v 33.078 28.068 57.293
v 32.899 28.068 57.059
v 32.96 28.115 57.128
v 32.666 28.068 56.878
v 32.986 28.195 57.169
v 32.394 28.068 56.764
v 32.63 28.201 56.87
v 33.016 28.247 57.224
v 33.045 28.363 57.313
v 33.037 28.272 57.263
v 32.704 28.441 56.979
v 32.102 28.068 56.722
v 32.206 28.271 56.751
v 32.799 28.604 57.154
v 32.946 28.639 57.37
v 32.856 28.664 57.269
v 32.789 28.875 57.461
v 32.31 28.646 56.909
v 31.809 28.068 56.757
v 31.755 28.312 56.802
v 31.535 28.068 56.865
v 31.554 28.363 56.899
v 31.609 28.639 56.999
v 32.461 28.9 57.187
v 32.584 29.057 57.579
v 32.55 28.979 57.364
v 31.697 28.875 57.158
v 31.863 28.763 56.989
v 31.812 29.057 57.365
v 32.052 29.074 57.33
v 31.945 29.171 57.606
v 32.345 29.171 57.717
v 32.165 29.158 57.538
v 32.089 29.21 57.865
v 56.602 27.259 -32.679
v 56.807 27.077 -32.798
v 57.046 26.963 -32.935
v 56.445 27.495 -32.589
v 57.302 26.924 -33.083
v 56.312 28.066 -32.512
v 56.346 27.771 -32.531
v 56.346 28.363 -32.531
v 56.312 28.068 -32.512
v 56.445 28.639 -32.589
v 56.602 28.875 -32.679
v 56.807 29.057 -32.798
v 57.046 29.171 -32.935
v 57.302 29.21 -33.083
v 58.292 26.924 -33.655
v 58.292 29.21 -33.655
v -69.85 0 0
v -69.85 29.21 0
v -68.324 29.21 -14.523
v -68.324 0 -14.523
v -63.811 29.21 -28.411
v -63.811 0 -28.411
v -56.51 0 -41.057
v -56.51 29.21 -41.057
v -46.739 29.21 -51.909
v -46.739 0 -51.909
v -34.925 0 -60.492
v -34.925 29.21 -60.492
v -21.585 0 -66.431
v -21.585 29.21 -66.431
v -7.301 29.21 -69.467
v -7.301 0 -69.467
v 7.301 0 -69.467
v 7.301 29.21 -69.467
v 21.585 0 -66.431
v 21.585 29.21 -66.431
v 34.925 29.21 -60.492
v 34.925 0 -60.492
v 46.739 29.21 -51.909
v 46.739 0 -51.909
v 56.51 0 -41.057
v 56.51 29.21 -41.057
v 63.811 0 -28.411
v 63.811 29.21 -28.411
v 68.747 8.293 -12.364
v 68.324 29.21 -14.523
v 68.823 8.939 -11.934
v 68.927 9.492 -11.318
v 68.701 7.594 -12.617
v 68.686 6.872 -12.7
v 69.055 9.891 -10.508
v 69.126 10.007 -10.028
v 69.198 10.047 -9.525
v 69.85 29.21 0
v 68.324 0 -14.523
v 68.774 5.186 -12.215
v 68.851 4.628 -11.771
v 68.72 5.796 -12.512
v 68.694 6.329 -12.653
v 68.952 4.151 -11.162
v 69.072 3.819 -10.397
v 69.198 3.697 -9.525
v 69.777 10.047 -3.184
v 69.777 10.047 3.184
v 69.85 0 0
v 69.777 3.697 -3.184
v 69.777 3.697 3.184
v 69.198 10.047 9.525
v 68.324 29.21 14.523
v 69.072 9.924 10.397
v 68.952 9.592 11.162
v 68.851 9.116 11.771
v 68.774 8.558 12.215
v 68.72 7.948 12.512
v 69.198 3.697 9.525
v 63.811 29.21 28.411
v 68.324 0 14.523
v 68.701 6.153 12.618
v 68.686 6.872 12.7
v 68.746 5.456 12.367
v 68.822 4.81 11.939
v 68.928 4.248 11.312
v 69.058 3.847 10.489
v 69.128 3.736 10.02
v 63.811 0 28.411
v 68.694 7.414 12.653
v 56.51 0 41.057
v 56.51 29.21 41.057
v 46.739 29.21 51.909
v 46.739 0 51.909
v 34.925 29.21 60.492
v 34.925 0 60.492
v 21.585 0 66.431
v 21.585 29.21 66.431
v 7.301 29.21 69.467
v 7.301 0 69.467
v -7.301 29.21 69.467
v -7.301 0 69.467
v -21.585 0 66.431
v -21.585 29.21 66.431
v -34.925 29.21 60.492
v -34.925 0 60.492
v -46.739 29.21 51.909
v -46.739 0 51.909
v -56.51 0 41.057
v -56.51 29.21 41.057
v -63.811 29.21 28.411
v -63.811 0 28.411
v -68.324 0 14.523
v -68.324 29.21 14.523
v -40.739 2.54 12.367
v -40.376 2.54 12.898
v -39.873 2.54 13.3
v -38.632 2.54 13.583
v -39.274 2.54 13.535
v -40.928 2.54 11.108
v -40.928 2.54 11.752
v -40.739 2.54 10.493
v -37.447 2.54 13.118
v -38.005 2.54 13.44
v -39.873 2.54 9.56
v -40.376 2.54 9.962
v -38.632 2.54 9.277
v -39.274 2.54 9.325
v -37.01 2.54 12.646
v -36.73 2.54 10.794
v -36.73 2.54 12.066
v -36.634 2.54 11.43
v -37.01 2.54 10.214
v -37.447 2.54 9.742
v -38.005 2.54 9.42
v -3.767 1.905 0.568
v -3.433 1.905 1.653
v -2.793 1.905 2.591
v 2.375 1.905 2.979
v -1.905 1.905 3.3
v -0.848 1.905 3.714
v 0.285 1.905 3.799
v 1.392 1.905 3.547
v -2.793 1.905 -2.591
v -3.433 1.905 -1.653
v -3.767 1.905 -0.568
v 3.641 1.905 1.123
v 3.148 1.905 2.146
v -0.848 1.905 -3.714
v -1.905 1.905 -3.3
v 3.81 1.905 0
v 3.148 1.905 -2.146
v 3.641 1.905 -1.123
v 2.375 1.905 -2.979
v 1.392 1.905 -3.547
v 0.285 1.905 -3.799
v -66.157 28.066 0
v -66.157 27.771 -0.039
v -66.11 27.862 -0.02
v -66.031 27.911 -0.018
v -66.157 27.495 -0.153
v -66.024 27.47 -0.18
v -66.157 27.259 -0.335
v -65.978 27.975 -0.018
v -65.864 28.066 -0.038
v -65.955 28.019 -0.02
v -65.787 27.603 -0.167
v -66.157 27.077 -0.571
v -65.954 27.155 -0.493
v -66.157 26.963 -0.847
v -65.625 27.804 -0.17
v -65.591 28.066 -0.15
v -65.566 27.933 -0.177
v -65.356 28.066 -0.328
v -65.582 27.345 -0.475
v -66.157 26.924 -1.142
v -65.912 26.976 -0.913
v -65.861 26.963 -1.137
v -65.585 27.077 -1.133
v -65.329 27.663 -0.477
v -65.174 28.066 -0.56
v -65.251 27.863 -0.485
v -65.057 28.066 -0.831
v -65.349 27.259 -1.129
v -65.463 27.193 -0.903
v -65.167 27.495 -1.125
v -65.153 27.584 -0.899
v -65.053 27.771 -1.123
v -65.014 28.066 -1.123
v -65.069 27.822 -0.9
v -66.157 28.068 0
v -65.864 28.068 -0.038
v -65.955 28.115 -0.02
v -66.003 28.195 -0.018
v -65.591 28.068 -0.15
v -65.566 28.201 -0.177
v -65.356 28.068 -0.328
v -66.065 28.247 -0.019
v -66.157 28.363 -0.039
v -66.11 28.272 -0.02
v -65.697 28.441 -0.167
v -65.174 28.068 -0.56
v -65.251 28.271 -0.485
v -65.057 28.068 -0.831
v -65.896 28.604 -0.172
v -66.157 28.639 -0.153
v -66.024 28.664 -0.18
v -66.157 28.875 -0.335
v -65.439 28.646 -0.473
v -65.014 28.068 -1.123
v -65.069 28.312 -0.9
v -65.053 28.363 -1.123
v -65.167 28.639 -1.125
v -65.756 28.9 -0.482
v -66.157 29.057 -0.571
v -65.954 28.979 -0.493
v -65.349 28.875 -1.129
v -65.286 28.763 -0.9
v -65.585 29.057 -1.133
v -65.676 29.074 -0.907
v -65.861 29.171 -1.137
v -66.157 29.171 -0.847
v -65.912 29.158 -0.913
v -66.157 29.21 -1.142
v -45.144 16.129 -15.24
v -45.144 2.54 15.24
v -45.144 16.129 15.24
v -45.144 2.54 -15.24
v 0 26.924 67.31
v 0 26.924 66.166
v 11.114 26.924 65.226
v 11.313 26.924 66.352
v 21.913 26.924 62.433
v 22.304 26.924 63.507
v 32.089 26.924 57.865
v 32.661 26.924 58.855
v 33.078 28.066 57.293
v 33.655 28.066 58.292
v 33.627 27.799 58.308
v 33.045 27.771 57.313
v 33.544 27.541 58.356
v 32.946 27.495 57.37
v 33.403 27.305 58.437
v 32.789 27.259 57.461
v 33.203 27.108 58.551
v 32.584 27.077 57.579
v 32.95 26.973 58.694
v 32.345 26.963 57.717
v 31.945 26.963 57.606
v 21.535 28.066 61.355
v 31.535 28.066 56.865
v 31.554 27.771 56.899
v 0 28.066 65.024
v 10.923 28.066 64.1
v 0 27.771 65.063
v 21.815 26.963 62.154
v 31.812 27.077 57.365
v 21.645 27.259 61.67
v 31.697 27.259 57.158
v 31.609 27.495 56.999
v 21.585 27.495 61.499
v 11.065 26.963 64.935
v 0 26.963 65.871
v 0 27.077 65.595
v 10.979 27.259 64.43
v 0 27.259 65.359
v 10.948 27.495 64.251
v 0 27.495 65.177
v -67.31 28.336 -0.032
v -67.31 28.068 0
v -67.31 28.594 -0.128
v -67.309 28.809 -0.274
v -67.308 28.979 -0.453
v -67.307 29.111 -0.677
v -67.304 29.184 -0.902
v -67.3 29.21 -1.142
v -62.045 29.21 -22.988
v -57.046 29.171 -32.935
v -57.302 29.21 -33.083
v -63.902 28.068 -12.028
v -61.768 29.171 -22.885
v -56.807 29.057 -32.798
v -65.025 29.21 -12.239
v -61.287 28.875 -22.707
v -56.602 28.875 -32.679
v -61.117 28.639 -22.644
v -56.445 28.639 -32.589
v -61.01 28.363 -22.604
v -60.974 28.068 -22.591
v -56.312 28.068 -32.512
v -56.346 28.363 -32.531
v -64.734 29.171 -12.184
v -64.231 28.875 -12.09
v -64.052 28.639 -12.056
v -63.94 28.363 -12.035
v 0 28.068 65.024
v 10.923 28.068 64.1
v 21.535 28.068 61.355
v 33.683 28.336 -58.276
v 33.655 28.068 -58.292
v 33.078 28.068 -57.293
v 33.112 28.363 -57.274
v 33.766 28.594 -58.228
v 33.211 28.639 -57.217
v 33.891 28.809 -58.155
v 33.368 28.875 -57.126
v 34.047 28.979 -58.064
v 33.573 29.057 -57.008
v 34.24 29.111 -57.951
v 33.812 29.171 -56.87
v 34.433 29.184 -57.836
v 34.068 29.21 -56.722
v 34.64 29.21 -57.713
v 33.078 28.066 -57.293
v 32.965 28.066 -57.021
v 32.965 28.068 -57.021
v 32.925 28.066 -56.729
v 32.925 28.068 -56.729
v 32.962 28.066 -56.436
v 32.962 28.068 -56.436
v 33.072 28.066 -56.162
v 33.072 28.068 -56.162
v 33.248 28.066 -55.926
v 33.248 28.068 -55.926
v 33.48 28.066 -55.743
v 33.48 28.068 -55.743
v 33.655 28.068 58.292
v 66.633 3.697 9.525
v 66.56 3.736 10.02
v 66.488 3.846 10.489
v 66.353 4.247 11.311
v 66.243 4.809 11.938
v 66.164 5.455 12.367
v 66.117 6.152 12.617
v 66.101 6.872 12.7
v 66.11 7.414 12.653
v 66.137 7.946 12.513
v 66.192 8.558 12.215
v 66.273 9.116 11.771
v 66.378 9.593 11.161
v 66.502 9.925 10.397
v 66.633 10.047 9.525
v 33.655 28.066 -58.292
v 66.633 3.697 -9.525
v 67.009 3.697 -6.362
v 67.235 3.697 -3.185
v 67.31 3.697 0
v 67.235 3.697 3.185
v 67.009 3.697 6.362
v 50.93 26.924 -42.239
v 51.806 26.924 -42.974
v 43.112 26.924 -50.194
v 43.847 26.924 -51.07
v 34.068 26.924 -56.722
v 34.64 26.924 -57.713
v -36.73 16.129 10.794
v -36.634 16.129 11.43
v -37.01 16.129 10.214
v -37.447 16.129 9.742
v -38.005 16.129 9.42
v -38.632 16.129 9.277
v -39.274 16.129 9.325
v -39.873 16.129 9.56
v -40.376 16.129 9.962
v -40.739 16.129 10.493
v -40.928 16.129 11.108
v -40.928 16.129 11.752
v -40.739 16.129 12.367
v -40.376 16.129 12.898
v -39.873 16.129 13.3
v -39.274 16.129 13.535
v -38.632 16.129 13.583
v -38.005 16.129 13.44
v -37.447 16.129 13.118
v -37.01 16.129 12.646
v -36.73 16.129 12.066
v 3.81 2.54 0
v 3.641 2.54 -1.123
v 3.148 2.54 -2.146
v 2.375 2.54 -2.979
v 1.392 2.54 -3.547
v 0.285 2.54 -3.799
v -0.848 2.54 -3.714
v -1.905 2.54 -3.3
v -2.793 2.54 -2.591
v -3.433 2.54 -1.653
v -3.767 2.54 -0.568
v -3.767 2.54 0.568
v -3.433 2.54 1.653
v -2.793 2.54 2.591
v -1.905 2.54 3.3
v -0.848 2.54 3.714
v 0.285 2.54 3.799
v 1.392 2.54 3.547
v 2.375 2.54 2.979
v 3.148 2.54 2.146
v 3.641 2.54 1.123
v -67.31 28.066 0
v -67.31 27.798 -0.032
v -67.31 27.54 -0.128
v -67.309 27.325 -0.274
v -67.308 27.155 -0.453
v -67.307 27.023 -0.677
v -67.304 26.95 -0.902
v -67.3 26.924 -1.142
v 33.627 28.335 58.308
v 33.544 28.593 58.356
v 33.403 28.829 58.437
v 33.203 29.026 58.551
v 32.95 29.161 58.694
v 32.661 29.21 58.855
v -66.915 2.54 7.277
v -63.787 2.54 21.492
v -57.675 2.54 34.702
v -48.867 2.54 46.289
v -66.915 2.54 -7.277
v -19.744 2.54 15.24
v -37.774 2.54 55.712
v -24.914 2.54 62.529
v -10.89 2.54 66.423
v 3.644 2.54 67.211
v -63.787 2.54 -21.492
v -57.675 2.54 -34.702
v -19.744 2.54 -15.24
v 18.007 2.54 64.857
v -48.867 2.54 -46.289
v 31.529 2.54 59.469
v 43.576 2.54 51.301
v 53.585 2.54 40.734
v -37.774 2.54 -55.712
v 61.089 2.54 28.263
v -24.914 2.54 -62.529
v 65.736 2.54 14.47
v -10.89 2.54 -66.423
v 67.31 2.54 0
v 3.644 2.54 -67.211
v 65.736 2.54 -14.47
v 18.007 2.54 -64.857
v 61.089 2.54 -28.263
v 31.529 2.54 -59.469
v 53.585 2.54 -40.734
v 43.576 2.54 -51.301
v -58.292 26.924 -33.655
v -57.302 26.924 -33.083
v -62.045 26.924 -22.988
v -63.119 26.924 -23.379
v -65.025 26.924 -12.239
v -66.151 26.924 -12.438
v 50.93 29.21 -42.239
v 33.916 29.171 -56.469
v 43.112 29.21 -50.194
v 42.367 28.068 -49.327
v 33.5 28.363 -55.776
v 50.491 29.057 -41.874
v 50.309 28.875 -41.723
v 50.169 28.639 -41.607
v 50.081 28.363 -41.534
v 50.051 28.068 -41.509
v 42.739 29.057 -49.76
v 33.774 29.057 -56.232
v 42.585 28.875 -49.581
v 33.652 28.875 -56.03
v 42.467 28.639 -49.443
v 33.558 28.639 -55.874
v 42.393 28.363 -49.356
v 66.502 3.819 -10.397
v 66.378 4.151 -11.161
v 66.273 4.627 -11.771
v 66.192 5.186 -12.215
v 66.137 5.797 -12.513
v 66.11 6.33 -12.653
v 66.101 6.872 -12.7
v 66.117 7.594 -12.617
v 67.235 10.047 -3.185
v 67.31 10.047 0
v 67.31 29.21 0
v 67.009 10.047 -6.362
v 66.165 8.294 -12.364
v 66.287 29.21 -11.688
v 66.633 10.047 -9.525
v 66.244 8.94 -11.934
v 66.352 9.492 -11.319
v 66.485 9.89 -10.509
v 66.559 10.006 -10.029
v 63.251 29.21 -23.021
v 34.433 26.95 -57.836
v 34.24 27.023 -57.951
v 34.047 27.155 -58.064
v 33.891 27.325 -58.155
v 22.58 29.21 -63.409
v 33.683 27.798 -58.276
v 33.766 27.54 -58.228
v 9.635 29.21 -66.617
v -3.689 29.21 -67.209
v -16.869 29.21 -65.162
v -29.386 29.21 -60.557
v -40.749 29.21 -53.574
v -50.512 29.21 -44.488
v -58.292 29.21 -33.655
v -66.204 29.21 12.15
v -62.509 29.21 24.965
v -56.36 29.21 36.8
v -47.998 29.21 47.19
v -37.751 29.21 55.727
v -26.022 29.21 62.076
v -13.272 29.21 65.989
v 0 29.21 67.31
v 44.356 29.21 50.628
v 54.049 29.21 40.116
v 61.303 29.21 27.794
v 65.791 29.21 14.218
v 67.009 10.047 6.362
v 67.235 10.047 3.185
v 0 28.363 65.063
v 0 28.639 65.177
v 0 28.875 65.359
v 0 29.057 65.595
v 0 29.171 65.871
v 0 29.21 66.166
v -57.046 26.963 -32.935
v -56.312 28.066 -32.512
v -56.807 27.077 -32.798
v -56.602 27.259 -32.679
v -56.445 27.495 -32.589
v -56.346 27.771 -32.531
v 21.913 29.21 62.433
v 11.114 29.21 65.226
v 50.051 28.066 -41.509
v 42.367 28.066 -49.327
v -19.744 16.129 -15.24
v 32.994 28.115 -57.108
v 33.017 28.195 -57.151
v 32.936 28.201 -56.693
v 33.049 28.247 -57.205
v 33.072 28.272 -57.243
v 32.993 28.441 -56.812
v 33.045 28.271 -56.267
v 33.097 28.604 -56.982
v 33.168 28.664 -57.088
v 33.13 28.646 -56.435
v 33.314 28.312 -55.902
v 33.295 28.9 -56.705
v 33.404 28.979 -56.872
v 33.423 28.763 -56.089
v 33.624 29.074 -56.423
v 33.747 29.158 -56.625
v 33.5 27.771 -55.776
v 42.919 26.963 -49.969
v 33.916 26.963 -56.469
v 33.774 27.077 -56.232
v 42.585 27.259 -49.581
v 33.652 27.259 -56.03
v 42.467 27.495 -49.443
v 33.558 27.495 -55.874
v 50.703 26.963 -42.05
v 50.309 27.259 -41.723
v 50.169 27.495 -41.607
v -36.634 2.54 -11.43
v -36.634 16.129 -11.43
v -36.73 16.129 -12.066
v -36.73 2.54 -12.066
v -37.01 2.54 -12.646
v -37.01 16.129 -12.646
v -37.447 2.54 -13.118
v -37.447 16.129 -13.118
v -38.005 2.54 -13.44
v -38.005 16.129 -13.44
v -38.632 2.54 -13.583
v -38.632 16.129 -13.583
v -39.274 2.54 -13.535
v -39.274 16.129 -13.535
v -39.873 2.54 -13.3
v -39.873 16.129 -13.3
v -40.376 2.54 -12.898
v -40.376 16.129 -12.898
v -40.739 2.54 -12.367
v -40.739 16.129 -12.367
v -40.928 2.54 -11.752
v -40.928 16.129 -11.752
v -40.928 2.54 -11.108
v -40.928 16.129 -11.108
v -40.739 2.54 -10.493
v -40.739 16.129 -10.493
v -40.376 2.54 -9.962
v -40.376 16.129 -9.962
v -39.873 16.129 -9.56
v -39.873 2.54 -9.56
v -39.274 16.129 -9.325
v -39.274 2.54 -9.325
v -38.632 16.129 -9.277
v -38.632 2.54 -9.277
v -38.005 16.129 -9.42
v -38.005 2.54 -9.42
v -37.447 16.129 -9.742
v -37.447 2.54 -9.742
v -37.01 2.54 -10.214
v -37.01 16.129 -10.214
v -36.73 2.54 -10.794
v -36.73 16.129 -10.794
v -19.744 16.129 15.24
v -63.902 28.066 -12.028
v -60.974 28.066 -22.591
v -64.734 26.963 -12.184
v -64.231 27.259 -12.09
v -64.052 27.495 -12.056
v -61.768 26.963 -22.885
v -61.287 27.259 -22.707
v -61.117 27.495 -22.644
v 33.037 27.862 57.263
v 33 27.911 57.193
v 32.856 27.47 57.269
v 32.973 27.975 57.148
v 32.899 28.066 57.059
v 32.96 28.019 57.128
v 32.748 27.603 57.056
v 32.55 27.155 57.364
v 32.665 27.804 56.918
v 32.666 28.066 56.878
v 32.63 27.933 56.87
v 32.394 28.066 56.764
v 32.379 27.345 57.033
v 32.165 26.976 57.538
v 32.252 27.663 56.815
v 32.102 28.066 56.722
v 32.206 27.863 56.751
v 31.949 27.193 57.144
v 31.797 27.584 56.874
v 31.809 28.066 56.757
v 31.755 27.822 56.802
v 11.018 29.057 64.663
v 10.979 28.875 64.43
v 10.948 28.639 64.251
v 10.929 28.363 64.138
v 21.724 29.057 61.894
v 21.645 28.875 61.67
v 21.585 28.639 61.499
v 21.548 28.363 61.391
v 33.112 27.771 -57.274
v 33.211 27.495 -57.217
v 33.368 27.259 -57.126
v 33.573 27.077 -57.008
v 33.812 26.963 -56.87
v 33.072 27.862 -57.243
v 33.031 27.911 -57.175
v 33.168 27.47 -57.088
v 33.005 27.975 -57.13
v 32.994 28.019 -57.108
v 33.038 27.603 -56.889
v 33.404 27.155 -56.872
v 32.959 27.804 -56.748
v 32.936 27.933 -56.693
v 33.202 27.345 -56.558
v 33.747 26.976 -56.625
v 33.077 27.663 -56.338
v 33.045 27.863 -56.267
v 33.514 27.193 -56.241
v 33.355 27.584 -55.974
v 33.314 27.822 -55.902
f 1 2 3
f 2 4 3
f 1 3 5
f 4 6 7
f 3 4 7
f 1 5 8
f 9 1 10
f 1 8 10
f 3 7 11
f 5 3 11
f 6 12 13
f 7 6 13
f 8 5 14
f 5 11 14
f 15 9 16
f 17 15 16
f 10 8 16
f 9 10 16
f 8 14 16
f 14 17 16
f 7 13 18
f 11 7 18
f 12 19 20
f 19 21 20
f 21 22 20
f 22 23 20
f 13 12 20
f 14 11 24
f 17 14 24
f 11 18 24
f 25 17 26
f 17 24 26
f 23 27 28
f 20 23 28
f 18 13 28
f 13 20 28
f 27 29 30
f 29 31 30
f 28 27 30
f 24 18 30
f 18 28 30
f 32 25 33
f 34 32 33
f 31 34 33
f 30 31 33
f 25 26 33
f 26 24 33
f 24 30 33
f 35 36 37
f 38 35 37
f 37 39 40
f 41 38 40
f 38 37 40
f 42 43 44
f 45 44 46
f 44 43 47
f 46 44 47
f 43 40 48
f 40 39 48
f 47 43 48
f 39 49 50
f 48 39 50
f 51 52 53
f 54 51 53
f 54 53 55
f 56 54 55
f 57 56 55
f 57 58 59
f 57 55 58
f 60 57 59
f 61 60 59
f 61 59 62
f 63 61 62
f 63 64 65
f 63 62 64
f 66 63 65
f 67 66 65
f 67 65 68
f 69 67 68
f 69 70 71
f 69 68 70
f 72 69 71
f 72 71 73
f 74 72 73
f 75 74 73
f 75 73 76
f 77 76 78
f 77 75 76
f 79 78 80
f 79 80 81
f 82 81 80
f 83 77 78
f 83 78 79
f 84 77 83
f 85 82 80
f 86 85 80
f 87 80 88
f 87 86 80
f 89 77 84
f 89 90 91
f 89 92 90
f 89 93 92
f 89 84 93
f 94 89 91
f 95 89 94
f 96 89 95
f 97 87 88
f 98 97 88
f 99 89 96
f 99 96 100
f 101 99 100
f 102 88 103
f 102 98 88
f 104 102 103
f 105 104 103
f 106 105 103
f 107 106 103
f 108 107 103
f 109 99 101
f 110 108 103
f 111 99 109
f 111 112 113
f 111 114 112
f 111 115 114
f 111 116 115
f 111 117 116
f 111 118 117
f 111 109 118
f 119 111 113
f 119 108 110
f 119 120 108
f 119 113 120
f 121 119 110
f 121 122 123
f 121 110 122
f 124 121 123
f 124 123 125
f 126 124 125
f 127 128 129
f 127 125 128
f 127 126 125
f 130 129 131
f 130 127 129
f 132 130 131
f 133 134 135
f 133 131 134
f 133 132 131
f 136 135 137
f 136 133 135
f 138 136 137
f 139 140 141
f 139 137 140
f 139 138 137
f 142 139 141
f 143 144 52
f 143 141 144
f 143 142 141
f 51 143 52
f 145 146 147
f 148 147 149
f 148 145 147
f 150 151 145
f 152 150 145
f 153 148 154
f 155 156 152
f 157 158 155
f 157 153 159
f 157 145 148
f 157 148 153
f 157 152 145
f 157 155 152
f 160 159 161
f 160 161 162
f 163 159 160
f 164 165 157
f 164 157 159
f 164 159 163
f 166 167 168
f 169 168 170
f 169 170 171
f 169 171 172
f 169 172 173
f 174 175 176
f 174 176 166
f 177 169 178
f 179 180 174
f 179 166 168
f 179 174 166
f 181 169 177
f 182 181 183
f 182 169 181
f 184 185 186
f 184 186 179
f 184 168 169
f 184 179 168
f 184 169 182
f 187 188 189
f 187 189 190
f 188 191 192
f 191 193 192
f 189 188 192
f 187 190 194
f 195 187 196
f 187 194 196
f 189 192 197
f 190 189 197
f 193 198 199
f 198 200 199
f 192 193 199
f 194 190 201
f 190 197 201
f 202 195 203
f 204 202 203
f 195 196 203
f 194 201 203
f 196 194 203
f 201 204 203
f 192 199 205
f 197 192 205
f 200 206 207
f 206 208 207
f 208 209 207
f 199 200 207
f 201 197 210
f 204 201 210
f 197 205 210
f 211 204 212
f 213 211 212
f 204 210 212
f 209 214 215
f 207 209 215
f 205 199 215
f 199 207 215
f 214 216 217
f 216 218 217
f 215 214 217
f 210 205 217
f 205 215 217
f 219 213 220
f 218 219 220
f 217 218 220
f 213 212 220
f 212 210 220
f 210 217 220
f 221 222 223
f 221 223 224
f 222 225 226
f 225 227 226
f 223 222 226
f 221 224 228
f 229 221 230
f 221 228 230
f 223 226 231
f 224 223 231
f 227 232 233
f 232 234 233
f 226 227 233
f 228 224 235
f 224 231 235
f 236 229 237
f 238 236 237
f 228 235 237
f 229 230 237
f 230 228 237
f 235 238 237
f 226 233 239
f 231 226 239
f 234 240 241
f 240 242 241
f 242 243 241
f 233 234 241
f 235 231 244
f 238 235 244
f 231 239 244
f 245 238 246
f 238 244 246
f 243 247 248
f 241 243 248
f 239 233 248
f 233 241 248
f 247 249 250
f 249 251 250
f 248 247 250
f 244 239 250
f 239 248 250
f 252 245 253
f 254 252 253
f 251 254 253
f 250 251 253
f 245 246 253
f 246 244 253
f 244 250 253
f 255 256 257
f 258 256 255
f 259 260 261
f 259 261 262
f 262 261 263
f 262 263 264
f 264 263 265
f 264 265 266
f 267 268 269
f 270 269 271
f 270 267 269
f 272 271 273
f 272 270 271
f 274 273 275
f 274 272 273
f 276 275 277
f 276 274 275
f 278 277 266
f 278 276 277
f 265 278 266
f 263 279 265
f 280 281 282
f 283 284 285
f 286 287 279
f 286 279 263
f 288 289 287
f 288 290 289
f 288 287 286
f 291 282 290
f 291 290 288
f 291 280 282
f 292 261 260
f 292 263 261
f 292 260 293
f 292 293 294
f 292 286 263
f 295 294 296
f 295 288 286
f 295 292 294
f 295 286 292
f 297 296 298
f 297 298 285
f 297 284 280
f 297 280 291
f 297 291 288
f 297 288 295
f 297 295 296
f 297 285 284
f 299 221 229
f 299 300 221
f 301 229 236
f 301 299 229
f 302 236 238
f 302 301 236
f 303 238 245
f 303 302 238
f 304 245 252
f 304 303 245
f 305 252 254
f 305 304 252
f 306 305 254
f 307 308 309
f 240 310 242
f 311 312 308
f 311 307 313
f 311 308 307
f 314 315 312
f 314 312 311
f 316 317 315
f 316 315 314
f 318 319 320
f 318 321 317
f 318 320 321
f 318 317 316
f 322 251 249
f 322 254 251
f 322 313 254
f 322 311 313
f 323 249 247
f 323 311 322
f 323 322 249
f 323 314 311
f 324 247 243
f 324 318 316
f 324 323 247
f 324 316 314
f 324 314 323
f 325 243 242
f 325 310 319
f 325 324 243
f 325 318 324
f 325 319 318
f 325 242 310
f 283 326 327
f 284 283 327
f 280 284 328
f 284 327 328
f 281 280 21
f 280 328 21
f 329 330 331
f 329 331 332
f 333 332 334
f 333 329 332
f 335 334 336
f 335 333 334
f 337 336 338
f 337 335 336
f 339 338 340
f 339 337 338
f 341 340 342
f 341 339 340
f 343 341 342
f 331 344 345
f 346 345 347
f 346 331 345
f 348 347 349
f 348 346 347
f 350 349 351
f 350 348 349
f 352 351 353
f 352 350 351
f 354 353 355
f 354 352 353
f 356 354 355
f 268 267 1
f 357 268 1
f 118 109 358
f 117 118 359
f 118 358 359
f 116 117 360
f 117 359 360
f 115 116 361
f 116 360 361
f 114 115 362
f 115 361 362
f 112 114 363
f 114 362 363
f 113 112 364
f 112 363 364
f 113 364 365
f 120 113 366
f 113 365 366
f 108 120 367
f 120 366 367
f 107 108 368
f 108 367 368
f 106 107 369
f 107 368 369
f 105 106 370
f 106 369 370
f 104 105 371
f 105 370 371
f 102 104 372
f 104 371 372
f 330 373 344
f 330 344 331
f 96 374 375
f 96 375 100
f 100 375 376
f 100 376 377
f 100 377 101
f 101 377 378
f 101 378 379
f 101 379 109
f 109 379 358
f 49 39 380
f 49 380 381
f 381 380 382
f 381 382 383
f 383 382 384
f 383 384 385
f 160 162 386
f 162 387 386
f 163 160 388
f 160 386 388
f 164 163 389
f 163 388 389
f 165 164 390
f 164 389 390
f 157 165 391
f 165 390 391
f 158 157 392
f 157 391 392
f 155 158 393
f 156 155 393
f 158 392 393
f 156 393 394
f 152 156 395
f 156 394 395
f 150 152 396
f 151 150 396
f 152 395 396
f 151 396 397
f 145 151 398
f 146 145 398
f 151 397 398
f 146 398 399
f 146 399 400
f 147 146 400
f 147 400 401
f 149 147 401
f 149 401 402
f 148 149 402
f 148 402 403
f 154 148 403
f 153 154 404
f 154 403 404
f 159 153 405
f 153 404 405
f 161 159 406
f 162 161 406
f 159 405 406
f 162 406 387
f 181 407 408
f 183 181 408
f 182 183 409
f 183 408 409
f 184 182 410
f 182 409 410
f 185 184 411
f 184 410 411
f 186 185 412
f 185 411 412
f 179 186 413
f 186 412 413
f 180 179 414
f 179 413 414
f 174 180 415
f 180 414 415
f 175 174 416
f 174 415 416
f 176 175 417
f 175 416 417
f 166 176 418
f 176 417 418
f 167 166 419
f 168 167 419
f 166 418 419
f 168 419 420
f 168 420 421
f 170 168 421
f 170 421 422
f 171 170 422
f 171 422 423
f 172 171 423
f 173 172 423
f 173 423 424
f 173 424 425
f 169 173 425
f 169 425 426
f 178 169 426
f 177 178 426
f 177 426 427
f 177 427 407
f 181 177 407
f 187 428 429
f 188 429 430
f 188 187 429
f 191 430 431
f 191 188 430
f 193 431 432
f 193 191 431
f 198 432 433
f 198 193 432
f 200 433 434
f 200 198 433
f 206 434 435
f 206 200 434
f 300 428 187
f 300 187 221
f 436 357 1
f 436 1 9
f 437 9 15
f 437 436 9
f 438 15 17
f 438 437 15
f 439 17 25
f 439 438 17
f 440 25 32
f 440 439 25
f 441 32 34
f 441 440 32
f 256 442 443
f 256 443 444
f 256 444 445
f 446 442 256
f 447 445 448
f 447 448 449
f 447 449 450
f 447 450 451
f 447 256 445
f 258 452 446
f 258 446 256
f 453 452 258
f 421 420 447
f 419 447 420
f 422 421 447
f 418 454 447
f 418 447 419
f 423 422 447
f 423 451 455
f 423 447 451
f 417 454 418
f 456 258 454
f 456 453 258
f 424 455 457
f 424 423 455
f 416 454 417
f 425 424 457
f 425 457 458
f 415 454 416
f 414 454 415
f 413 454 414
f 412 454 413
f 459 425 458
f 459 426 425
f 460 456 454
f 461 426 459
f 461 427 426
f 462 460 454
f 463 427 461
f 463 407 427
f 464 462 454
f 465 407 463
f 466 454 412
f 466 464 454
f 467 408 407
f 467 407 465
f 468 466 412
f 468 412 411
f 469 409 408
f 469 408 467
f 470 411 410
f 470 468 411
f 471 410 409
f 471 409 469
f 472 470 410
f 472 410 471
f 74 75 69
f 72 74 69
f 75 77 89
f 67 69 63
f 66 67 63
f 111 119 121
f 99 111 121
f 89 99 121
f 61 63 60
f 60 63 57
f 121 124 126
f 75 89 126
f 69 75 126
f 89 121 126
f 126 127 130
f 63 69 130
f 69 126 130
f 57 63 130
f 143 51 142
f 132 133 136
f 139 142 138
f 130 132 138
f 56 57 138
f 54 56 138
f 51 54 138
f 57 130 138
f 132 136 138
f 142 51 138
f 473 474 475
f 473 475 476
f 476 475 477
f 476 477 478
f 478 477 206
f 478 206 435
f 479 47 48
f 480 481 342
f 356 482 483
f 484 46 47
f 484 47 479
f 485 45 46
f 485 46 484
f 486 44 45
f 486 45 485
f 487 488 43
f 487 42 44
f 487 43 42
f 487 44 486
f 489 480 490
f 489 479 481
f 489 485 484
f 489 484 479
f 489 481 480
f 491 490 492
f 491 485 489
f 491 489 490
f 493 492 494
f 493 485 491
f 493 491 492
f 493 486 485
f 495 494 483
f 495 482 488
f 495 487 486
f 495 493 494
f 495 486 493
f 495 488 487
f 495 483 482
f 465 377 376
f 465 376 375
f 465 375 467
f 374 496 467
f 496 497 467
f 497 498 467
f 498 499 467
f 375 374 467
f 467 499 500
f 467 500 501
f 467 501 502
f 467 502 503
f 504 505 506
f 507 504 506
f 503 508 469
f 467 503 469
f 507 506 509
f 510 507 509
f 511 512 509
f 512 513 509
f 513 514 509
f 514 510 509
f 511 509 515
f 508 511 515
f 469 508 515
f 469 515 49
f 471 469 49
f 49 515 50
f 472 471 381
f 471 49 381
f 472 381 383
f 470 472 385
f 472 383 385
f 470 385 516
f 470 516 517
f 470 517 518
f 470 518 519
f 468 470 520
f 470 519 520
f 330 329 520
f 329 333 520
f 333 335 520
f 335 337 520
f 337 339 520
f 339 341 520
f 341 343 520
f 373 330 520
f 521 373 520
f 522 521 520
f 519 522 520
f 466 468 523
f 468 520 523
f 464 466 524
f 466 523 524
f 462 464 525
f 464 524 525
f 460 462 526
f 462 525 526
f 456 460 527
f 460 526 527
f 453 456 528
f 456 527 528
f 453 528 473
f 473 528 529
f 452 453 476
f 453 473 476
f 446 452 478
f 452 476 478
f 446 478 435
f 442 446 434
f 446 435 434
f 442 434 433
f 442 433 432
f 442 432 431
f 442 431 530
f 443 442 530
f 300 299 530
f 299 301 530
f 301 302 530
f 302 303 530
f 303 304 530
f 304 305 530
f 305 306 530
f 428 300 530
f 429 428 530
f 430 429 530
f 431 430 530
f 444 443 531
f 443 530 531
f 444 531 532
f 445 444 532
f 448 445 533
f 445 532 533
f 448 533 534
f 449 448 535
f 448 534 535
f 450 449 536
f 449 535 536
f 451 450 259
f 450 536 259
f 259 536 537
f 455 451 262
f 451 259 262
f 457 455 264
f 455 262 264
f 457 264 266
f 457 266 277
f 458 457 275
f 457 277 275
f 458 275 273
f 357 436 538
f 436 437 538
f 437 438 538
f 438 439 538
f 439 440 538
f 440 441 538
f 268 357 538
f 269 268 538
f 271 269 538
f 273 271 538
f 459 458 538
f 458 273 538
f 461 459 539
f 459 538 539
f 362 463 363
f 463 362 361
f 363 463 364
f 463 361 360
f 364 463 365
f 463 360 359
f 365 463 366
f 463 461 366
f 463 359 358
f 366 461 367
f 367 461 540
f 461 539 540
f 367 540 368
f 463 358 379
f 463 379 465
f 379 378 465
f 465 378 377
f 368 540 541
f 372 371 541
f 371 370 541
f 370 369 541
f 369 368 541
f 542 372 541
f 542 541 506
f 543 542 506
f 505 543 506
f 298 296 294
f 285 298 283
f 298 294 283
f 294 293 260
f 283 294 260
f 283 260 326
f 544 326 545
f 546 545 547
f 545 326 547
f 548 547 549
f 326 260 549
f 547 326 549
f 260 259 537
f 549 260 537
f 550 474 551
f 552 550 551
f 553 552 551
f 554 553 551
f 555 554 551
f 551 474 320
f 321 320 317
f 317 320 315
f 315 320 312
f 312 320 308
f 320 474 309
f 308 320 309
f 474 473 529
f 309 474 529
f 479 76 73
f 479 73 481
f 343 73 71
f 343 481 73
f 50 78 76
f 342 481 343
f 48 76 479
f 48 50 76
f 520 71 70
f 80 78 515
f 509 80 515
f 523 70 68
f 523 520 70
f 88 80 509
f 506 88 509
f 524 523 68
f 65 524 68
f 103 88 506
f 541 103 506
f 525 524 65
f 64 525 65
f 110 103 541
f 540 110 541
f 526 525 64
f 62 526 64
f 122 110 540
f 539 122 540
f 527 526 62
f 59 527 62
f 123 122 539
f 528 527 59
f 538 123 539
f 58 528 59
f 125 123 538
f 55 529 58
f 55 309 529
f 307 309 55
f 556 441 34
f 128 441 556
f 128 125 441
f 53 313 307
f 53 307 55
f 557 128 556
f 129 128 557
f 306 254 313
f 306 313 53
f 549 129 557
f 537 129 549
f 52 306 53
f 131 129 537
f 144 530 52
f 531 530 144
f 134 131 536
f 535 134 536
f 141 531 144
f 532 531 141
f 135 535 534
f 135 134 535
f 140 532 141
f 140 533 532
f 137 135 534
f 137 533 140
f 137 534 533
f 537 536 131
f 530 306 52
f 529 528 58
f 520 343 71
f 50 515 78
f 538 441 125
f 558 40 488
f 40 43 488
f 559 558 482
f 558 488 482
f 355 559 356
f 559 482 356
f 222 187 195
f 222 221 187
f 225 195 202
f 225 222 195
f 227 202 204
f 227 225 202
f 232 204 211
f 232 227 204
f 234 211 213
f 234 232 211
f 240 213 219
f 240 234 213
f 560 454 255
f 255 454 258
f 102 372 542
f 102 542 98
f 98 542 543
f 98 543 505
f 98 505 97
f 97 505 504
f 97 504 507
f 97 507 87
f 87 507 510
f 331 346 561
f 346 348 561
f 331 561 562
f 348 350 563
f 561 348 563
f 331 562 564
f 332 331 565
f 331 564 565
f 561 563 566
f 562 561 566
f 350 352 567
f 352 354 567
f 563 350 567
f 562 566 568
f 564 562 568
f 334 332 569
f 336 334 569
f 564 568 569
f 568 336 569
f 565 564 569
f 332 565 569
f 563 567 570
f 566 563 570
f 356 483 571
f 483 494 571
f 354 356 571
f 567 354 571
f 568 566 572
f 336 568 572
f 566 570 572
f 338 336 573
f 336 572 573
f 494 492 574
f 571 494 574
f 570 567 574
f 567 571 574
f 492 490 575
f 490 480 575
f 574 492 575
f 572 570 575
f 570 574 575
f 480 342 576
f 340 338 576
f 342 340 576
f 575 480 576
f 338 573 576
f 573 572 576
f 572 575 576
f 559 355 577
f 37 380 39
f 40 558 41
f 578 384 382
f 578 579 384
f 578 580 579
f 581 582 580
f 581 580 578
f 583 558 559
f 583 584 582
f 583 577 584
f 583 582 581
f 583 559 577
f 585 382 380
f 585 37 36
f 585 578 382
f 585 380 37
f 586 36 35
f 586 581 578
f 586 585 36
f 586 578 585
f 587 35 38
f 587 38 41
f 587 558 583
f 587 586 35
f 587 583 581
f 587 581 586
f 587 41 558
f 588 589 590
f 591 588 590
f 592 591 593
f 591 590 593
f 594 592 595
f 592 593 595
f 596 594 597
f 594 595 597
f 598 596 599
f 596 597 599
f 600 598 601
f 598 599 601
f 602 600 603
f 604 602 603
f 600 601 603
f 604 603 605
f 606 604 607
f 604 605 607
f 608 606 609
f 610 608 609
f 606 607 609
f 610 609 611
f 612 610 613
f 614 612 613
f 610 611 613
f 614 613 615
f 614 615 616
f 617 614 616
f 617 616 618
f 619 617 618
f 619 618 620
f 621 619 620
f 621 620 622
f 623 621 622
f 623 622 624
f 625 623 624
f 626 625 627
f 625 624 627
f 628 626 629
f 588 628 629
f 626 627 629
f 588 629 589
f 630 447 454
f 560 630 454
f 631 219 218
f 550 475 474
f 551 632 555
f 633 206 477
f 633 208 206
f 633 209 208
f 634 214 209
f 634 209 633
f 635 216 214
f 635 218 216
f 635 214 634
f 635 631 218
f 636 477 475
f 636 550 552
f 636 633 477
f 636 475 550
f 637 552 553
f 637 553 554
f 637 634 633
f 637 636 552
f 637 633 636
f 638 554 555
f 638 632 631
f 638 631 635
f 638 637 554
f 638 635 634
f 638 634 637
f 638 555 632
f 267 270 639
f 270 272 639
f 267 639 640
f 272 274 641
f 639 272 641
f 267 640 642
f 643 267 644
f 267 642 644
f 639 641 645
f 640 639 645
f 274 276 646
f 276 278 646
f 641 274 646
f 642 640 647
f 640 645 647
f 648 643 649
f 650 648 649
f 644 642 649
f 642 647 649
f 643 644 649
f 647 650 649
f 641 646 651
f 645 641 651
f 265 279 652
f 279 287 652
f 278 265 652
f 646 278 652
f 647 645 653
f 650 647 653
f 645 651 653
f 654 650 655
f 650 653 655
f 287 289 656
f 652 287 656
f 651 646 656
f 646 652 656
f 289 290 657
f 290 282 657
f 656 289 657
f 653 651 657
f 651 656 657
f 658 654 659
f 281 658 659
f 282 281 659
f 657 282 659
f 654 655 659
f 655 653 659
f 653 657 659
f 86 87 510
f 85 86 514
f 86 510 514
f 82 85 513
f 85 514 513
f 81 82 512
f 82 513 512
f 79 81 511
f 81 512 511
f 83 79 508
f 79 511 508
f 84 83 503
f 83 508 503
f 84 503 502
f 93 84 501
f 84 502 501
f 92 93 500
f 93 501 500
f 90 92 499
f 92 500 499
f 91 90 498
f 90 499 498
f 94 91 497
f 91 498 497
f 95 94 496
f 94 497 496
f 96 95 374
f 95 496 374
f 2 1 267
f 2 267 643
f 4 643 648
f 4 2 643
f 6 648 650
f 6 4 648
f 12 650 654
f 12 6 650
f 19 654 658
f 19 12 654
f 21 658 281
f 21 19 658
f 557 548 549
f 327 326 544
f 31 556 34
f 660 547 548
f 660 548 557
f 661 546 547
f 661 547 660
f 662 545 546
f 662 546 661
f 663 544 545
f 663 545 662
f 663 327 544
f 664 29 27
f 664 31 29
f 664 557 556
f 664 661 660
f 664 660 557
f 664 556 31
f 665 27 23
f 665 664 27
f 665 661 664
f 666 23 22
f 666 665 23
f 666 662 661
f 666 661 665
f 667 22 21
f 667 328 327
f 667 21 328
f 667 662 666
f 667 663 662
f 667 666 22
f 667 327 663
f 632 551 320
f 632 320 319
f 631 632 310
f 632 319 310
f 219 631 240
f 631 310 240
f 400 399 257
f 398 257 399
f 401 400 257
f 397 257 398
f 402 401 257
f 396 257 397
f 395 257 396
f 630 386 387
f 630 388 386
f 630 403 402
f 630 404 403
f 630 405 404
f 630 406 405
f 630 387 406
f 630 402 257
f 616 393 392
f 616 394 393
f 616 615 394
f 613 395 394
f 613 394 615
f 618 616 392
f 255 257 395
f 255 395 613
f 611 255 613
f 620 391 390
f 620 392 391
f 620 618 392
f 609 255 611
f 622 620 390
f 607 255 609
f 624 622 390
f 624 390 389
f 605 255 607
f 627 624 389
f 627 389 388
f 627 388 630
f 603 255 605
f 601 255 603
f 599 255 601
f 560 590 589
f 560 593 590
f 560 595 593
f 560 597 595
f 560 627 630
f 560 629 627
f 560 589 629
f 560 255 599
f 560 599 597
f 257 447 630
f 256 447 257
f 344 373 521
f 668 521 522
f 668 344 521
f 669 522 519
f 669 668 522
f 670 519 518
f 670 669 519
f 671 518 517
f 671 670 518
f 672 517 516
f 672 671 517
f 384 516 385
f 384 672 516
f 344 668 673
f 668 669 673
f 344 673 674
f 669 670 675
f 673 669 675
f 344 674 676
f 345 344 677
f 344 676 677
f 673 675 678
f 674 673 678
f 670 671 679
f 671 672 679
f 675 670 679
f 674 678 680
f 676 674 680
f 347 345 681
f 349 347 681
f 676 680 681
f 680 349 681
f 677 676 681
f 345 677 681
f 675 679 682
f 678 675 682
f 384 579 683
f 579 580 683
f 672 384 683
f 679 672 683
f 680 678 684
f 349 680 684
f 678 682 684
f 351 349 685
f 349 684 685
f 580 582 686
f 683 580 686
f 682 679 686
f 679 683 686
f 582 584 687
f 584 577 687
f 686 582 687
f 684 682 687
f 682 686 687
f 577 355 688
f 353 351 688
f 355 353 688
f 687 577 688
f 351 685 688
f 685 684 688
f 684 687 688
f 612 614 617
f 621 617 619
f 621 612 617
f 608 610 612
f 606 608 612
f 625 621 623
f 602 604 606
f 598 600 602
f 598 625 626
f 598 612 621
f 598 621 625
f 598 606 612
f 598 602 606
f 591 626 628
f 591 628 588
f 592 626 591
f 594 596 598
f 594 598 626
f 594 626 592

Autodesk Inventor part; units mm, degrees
ref_plane "YZ Plane" through (0, 0, 0) normal (1, 0, 0) x (0, 1, 0)
ref_plane "XZ Plane" through (0, 0, 0) normal (0, 1, 0) x (-1, 0, 0)
ref_plane "XY Plane" through (0, 0, 0) normal (0, 0, 1) x (1, 0, 0)
sketch "Sketch1" plane through (0, 0, 0) normal (0, 1, 0) x (-1, 0, 0)
  circle A0 centre (0, 0) radius 69.85
  dimension "d0" = 139.7
extrude "Extrusion1" add sketch "Sketch1" along normal blind 29.21
sketch "Sketch3" plane through (0, 29.21, 0) normal (0, 1, 0) x (1, 0, 0)
  circle A0 centre (0, 0) radius 67.31
  dimension "d5" = 134.62
extrude "Extrusion2" cut sketch "Sketch3" against normal blind 26.67
sketch "Sketch6" plane through (0, 0, 0) normal (1, 0, 0) x (0, 1, 0)
  line L0 (29.21, 67.31) -> (2.54, 67.31) projected
  line L1 (29.21, 67.31) -> (26.924, 67.31)
  line L2 (26.924, 67.31) -> (26.924, 65.024)
  line L3 (26.924, 65.024) -> (29.21, 65.024)
  line L4 (29.21, 65.024) -> (29.21, 67.31)
  line L5 (-5.842, 0) -> (35.052, 0) projected
  line L6 (29.21, -69.85) -> (29.21, 69.85) projected
  point P0 (0, 0)
  dimension "d21" = 2.286
  dimension "d22" = 2.286
  dimension "d36" = 0
revolve "Revolution1" add sketch "Sketch6" angle 30 about axis through (0, -10, 0) along (0, 1, 0)
fillet "Fillet2" radius 1.143 2 edges at (16.8294, 26.924, 62.8084) (16.8294, 29.21, 62.8084)
fillet "Fillet3" radius 1.143 3 edges at (32.6793, 27.2586, 56.6022) (33.3691, 29.21, 57.797) (33.3691, 26.924, 57.797)
pattern_circular "Circular Pattern1" count 3 over 360 about axis through (0, 0, 0) along (0, 1, 0) of "Revolution1", "Fillet2", "Fillet3"
sketch "Sketch9" plane through (0, 0, 0) normal (1, 0, 0) x (0, 1, 0)
  circle A0 centre (6.8717, 0) radius 3.175 construction
  line L0 (6.8717, 0) -> (6.8717, -12.7) construction
  line L1 (6.8717, 0) -> (6.8717, 12.7) construction
  line L2 (6.8717, -12.7) -> (6.8717, -12.7)
  line L3 (3.6967, -9.525) -> (3.6967, 9.525)
  line L4 (6.8717, 12.7) -> (6.8717, 12.7)
  line L5 (10.0467, 9.525) -> (10.0467, -9.525)
  arc A1 (6.8717, -12.7) -> (10.0467, -9.525) centre (6.8717, -9.525) ccw
  arc A2 (3.6967, -9.525) -> (6.8717, -12.7) centre (6.8717, -9.525) ccw
  arc A3 (6.8717, 12.7) -> (3.6967, 9.525) centre (6.8717, 9.525) ccw
  arc A4 (10.0467, 9.525) -> (6.8717, 12.7) centre (6.8717, 9.525) ccw
  point P0 (0, 0)
  dimension "d37" = 6.35
  dimension "d48" = 12.7
  dimension "d49" = 12.7
  dimension "d50" = 3.175
extrude "Extrusion9" cut sketch "Sketch9" along normal through all
sketch "Sketch15" plane through (0, 2.54, 0) normal (0, 1, 0) x (1, 0, 0)
  line L0 (-19.7435, -6.1595) -> (-19.7435, 6.1595)
  line L1 (-31.8085, -6.1595) -> (-19.7435, -6.1595)
  line L2 (-31.8085, 6.1595) -> (-19.7435, 6.1595)
  line L3 (-47.8867, -3.627) -> (-47.8867, 3.627)
  point P0 (0, 0)
sketch "Sketch16" plane through (0, 2.54, 0) normal (0, 1, 0) x (1, 0, 0)
  line L0 (-19.7435, -6.1595) -> (-19.7435, 6.1595) construction
  line L1 (-31.8085, 6.1595) -> (-19.7435, 6.1595) construction
  line L2 (-31.8085, -6.1595) -> (-19.7435, -6.1595) construction
  line L3 (-47.8867, -3.627) -> (-47.8867, 3.627) construction
  line L4 (-19.7435, 0) -> (-19.7435, 15.24)
  line L5 (-19.7435, 15.24) -> (-45.1435, 15.24)
  line L6 (-19.7435, 0) -> (-19.7435, -15.24)
  line L7 (-19.7435, -15.24) -> (-45.1435, -15.24)
  line L8 (-45.1435, -15.24) -> (-45.1435, 15.24)
  point P0 (0, 0)
  dimension "d53" = 15.24
  dimension "d54" = 25.4
  dimension "d55" = 15.24
  dimension "d56" = 25.4
extrude "Extrusion10" add sketch "Sketch16" along normal blind 13.589
sketch "Sketch17" plane through (0, 16.129, 0) normal (0, 1, 0) x (1, 0, 0)
  circle A0 centre (-38.7935, -11.43) radius 2.159
  circle A1 centre (-38.7935, 11.43) radius 2.159
  line L0 (-45.1435, -15.24) -> (-19.7435, -15.24) projected
  line L1 (-45.1435, 15.24) -> (-45.1435, -15.24) projected
  point P0 (0, 0)
  dimension "d59" = 4.318
  dimension "d60" = 4.318
  dimension "d61" = 22.86
  dimension "d62" = 3.81
  dimension "d63" = 6.35
  dimension "d64" = 6.35
extrude "Extrusion11" cut sketch "Sketch17" against normal blind 13.589
sketch "Sketch18" plane through (0, 2.54, 0) normal (0, 1, 0) x (1, 0, 0)
  circle A0 centre (0, 0) radius 3.81
  dimension "d67" = 7.62
extrude "Extrusion12" cut sketch "Sketch18" against normal blind 0.635
properties part number "bottom_basket"
